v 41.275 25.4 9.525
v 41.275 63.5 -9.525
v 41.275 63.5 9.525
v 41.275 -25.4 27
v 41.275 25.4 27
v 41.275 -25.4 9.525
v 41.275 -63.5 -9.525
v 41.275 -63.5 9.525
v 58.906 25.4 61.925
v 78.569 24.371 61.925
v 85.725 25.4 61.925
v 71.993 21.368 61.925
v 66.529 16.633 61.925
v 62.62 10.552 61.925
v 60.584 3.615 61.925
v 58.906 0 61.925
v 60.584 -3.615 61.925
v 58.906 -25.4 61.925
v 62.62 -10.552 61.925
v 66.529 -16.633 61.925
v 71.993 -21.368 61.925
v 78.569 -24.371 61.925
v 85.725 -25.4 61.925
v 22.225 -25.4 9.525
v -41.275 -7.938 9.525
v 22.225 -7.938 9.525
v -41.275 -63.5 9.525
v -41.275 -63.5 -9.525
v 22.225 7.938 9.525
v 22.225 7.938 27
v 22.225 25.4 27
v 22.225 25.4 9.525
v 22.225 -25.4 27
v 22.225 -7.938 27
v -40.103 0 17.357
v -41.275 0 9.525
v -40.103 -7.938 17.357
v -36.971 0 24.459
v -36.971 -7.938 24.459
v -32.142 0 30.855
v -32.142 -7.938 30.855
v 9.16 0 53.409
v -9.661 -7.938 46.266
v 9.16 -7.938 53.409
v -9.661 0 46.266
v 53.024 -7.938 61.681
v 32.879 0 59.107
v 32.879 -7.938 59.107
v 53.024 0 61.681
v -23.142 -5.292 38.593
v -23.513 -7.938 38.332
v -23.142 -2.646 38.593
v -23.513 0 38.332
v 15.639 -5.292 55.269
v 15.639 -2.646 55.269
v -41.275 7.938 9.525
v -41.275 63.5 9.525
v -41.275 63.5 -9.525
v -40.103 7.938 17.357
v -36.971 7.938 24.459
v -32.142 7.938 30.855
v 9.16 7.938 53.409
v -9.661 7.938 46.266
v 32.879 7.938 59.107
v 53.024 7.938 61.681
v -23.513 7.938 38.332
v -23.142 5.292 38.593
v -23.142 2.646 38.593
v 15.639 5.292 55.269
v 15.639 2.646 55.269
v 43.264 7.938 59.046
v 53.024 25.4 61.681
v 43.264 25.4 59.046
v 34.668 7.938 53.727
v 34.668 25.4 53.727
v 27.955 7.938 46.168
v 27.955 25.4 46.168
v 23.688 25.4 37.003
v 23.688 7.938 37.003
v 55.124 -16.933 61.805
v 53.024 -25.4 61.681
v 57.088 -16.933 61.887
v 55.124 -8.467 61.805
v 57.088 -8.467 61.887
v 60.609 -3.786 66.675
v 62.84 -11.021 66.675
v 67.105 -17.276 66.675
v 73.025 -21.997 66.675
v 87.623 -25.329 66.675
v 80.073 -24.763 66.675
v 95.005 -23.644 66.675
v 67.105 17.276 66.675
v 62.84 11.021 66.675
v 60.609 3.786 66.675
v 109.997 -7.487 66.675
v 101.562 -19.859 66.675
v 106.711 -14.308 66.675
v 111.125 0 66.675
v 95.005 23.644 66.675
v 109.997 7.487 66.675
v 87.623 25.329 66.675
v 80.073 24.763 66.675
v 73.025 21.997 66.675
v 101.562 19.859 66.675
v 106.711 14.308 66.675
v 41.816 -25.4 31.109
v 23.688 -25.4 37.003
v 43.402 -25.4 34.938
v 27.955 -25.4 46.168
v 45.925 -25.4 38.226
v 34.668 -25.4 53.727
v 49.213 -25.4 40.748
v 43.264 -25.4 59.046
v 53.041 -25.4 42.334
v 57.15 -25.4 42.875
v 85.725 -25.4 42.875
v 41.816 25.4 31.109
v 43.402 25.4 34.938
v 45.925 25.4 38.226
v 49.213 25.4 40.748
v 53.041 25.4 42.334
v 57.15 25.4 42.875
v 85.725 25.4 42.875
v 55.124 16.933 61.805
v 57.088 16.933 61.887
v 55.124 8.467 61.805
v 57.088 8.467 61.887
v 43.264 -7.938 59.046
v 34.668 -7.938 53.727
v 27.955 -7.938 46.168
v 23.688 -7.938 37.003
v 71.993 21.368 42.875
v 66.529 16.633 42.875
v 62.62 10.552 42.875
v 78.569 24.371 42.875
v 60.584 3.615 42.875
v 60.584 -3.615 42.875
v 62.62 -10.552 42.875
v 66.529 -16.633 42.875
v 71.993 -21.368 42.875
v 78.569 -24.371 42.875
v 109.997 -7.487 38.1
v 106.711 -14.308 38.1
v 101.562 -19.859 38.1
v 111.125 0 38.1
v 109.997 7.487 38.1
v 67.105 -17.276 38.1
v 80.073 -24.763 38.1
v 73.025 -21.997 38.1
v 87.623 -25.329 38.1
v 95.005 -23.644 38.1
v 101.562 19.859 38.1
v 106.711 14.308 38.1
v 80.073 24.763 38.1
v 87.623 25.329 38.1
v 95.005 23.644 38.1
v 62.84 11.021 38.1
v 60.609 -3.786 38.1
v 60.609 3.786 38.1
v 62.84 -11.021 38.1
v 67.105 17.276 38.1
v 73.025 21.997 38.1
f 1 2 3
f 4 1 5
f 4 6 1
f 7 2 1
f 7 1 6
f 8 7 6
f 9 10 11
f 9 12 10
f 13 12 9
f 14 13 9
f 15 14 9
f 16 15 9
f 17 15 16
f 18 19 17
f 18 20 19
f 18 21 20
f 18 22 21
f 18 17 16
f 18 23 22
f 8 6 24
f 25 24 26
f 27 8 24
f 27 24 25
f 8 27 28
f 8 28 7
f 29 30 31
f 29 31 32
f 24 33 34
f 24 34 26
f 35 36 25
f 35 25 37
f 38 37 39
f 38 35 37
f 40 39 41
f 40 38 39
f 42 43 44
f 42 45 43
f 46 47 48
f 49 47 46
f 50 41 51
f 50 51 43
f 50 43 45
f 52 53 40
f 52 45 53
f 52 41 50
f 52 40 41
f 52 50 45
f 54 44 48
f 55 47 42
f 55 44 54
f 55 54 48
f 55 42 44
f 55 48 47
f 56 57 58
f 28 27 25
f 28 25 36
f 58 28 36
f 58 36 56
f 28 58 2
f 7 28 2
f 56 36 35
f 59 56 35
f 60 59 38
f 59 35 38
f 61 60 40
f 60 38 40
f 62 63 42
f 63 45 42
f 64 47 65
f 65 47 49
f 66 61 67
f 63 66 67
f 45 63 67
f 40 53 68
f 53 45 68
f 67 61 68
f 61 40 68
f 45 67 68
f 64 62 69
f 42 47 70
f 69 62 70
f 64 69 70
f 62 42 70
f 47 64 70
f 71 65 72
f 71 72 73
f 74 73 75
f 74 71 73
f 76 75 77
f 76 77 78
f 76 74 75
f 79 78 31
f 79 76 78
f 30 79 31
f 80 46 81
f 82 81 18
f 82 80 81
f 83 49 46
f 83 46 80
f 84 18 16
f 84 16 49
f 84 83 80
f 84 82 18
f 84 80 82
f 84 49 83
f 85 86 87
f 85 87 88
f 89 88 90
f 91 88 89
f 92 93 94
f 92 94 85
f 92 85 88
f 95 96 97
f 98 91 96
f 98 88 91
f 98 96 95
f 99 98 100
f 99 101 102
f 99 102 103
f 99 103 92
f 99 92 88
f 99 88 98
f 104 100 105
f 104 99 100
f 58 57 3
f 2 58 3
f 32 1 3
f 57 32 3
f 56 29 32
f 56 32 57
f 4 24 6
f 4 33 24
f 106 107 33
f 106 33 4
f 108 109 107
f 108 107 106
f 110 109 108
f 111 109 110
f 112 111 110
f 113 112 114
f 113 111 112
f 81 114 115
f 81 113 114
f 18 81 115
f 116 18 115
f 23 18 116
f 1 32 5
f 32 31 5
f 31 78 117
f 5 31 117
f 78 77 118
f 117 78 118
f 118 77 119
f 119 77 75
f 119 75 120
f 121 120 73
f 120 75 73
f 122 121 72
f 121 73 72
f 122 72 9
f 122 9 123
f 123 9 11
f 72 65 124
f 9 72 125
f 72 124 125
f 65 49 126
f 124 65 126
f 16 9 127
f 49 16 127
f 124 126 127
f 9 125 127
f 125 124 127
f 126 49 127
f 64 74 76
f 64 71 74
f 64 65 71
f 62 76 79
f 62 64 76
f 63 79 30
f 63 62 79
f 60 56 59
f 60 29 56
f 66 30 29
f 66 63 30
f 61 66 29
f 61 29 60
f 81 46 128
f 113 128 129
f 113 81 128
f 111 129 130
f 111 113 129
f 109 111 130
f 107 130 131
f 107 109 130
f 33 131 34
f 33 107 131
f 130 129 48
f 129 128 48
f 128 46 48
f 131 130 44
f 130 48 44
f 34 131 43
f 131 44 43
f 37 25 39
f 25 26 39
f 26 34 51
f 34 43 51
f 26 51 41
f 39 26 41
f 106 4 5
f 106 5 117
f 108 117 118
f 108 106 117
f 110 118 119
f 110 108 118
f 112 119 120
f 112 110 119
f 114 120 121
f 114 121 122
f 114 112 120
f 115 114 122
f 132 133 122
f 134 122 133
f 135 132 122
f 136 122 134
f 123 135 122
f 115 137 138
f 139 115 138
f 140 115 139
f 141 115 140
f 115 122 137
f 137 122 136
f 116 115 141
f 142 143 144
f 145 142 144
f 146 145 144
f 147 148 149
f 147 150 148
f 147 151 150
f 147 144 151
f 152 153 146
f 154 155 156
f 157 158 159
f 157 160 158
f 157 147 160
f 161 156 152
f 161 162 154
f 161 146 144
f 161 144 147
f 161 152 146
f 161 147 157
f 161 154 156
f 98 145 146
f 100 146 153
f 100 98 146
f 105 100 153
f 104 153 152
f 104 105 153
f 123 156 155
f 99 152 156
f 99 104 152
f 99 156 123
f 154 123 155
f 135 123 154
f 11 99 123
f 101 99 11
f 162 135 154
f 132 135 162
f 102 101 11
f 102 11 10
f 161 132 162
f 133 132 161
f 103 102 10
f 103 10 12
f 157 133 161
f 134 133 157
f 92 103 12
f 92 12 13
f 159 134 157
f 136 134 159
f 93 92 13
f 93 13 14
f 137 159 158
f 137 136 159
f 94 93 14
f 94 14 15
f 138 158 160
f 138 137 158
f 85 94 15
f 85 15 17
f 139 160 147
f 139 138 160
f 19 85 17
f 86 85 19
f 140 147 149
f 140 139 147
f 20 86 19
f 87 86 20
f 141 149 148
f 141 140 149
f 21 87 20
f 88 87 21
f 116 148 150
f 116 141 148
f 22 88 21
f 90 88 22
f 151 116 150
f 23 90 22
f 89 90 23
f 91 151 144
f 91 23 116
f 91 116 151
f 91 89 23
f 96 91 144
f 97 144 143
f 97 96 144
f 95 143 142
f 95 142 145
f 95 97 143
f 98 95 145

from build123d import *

# Parameters (mm, degrees)
F1_DEPTH = 63.5
F0_W     = 25.4
F0_H     = 19.05
F2_DEPTH = 25.4
F3_DEPTH = 7.9375


with BuildPart() as f1:
    # F0 (on Front) → F1 (new body, symmetric)
    with BuildSketch(Plane.XZ):
        Polygon((-41.275, 9.525), (-41.275, -9.525), (41.275, -9.525), (41.275, 9.525), (22.225, 9.525), align=None)
    extrude(amount=F1_DEPTH, both=True)

    # F0 (on Front) → F2 (join, symmetric)
    with BuildSketch(Plane.XZ):
        with BuildLine():
            Line((22.225, 9.525), (41.275, 9.525))
            Line((41.275, 9.525), (41.275, 27.0002))
            ThreePointArc((41.275, 27.0002), (45.92468, 38.22552), (57.15, 42.8752))
            Line((57.15, 42.8752), (60.325, 42.8752))
            Line((60.325, 42.8752), (60.325, 61.9252))
            Line((60.325, 61.9252), (58.905696, 61.9252))
            add(Edge.make_bspline(
                [(53.024491, 61.680682), (55.189714, 61.827395), (57.163409, 61.907619), (58.905696, 61.9252)],
                knots=[104.433612, 104.433612, 104.433612, 104.433612, 112.141058, 112.141058, 112.141058, 112.141058], degree=3))
            ThreePointArc((53.024491, 61.680682), (31.036411, 50.191494), (22.225, 27.0002))
            Line((22.225, 27.0002), (22.225, 9.525))
        make_face()
        with Locations((73.025, 52.4002)):
            Rectangle(F0_W, F0_H)
    extrude(amount=F2_DEPTH, both=True)

    # F0 (on Front) → F3 (join, symmetric)
    with BuildSketch(Plane.XZ):
        with BuildLine():
            add(Edge.make_bspline(
                [(-41.275, 9.525), (-40.815407, 45.497738), (23.686354, 59.692761), (53.024491, 61.680682)],
                knots=[0, 0, 0, 0, 104.433612, 104.433612, 104.433612, 104.433612], degree=3))
            Line((-41.275, 9.525), (22.225, 9.525))
            Line((22.225, 9.525), (22.225, 27.0002))
            ThreePointArc((22.225, 27.0002), (31.036411, 50.191494), (53.024491, 61.680682))
        make_face()
    extrude(amount=F3_DEPTH, both=True)

    # F0 (on Front) → F4 (revolve)
    with BuildSketch(Plane.XZ):
        Polygon((85.725, 66.675), (85.725, 61.9252), (85.725, 42.8752), (85.725, 38.1), (111.125, 38.1), (111.125, 66.675), align=None)
    revolve(axis=Axis((85.725, 0, 52.3875), (0, 0, 1)))


solid = f1.part
